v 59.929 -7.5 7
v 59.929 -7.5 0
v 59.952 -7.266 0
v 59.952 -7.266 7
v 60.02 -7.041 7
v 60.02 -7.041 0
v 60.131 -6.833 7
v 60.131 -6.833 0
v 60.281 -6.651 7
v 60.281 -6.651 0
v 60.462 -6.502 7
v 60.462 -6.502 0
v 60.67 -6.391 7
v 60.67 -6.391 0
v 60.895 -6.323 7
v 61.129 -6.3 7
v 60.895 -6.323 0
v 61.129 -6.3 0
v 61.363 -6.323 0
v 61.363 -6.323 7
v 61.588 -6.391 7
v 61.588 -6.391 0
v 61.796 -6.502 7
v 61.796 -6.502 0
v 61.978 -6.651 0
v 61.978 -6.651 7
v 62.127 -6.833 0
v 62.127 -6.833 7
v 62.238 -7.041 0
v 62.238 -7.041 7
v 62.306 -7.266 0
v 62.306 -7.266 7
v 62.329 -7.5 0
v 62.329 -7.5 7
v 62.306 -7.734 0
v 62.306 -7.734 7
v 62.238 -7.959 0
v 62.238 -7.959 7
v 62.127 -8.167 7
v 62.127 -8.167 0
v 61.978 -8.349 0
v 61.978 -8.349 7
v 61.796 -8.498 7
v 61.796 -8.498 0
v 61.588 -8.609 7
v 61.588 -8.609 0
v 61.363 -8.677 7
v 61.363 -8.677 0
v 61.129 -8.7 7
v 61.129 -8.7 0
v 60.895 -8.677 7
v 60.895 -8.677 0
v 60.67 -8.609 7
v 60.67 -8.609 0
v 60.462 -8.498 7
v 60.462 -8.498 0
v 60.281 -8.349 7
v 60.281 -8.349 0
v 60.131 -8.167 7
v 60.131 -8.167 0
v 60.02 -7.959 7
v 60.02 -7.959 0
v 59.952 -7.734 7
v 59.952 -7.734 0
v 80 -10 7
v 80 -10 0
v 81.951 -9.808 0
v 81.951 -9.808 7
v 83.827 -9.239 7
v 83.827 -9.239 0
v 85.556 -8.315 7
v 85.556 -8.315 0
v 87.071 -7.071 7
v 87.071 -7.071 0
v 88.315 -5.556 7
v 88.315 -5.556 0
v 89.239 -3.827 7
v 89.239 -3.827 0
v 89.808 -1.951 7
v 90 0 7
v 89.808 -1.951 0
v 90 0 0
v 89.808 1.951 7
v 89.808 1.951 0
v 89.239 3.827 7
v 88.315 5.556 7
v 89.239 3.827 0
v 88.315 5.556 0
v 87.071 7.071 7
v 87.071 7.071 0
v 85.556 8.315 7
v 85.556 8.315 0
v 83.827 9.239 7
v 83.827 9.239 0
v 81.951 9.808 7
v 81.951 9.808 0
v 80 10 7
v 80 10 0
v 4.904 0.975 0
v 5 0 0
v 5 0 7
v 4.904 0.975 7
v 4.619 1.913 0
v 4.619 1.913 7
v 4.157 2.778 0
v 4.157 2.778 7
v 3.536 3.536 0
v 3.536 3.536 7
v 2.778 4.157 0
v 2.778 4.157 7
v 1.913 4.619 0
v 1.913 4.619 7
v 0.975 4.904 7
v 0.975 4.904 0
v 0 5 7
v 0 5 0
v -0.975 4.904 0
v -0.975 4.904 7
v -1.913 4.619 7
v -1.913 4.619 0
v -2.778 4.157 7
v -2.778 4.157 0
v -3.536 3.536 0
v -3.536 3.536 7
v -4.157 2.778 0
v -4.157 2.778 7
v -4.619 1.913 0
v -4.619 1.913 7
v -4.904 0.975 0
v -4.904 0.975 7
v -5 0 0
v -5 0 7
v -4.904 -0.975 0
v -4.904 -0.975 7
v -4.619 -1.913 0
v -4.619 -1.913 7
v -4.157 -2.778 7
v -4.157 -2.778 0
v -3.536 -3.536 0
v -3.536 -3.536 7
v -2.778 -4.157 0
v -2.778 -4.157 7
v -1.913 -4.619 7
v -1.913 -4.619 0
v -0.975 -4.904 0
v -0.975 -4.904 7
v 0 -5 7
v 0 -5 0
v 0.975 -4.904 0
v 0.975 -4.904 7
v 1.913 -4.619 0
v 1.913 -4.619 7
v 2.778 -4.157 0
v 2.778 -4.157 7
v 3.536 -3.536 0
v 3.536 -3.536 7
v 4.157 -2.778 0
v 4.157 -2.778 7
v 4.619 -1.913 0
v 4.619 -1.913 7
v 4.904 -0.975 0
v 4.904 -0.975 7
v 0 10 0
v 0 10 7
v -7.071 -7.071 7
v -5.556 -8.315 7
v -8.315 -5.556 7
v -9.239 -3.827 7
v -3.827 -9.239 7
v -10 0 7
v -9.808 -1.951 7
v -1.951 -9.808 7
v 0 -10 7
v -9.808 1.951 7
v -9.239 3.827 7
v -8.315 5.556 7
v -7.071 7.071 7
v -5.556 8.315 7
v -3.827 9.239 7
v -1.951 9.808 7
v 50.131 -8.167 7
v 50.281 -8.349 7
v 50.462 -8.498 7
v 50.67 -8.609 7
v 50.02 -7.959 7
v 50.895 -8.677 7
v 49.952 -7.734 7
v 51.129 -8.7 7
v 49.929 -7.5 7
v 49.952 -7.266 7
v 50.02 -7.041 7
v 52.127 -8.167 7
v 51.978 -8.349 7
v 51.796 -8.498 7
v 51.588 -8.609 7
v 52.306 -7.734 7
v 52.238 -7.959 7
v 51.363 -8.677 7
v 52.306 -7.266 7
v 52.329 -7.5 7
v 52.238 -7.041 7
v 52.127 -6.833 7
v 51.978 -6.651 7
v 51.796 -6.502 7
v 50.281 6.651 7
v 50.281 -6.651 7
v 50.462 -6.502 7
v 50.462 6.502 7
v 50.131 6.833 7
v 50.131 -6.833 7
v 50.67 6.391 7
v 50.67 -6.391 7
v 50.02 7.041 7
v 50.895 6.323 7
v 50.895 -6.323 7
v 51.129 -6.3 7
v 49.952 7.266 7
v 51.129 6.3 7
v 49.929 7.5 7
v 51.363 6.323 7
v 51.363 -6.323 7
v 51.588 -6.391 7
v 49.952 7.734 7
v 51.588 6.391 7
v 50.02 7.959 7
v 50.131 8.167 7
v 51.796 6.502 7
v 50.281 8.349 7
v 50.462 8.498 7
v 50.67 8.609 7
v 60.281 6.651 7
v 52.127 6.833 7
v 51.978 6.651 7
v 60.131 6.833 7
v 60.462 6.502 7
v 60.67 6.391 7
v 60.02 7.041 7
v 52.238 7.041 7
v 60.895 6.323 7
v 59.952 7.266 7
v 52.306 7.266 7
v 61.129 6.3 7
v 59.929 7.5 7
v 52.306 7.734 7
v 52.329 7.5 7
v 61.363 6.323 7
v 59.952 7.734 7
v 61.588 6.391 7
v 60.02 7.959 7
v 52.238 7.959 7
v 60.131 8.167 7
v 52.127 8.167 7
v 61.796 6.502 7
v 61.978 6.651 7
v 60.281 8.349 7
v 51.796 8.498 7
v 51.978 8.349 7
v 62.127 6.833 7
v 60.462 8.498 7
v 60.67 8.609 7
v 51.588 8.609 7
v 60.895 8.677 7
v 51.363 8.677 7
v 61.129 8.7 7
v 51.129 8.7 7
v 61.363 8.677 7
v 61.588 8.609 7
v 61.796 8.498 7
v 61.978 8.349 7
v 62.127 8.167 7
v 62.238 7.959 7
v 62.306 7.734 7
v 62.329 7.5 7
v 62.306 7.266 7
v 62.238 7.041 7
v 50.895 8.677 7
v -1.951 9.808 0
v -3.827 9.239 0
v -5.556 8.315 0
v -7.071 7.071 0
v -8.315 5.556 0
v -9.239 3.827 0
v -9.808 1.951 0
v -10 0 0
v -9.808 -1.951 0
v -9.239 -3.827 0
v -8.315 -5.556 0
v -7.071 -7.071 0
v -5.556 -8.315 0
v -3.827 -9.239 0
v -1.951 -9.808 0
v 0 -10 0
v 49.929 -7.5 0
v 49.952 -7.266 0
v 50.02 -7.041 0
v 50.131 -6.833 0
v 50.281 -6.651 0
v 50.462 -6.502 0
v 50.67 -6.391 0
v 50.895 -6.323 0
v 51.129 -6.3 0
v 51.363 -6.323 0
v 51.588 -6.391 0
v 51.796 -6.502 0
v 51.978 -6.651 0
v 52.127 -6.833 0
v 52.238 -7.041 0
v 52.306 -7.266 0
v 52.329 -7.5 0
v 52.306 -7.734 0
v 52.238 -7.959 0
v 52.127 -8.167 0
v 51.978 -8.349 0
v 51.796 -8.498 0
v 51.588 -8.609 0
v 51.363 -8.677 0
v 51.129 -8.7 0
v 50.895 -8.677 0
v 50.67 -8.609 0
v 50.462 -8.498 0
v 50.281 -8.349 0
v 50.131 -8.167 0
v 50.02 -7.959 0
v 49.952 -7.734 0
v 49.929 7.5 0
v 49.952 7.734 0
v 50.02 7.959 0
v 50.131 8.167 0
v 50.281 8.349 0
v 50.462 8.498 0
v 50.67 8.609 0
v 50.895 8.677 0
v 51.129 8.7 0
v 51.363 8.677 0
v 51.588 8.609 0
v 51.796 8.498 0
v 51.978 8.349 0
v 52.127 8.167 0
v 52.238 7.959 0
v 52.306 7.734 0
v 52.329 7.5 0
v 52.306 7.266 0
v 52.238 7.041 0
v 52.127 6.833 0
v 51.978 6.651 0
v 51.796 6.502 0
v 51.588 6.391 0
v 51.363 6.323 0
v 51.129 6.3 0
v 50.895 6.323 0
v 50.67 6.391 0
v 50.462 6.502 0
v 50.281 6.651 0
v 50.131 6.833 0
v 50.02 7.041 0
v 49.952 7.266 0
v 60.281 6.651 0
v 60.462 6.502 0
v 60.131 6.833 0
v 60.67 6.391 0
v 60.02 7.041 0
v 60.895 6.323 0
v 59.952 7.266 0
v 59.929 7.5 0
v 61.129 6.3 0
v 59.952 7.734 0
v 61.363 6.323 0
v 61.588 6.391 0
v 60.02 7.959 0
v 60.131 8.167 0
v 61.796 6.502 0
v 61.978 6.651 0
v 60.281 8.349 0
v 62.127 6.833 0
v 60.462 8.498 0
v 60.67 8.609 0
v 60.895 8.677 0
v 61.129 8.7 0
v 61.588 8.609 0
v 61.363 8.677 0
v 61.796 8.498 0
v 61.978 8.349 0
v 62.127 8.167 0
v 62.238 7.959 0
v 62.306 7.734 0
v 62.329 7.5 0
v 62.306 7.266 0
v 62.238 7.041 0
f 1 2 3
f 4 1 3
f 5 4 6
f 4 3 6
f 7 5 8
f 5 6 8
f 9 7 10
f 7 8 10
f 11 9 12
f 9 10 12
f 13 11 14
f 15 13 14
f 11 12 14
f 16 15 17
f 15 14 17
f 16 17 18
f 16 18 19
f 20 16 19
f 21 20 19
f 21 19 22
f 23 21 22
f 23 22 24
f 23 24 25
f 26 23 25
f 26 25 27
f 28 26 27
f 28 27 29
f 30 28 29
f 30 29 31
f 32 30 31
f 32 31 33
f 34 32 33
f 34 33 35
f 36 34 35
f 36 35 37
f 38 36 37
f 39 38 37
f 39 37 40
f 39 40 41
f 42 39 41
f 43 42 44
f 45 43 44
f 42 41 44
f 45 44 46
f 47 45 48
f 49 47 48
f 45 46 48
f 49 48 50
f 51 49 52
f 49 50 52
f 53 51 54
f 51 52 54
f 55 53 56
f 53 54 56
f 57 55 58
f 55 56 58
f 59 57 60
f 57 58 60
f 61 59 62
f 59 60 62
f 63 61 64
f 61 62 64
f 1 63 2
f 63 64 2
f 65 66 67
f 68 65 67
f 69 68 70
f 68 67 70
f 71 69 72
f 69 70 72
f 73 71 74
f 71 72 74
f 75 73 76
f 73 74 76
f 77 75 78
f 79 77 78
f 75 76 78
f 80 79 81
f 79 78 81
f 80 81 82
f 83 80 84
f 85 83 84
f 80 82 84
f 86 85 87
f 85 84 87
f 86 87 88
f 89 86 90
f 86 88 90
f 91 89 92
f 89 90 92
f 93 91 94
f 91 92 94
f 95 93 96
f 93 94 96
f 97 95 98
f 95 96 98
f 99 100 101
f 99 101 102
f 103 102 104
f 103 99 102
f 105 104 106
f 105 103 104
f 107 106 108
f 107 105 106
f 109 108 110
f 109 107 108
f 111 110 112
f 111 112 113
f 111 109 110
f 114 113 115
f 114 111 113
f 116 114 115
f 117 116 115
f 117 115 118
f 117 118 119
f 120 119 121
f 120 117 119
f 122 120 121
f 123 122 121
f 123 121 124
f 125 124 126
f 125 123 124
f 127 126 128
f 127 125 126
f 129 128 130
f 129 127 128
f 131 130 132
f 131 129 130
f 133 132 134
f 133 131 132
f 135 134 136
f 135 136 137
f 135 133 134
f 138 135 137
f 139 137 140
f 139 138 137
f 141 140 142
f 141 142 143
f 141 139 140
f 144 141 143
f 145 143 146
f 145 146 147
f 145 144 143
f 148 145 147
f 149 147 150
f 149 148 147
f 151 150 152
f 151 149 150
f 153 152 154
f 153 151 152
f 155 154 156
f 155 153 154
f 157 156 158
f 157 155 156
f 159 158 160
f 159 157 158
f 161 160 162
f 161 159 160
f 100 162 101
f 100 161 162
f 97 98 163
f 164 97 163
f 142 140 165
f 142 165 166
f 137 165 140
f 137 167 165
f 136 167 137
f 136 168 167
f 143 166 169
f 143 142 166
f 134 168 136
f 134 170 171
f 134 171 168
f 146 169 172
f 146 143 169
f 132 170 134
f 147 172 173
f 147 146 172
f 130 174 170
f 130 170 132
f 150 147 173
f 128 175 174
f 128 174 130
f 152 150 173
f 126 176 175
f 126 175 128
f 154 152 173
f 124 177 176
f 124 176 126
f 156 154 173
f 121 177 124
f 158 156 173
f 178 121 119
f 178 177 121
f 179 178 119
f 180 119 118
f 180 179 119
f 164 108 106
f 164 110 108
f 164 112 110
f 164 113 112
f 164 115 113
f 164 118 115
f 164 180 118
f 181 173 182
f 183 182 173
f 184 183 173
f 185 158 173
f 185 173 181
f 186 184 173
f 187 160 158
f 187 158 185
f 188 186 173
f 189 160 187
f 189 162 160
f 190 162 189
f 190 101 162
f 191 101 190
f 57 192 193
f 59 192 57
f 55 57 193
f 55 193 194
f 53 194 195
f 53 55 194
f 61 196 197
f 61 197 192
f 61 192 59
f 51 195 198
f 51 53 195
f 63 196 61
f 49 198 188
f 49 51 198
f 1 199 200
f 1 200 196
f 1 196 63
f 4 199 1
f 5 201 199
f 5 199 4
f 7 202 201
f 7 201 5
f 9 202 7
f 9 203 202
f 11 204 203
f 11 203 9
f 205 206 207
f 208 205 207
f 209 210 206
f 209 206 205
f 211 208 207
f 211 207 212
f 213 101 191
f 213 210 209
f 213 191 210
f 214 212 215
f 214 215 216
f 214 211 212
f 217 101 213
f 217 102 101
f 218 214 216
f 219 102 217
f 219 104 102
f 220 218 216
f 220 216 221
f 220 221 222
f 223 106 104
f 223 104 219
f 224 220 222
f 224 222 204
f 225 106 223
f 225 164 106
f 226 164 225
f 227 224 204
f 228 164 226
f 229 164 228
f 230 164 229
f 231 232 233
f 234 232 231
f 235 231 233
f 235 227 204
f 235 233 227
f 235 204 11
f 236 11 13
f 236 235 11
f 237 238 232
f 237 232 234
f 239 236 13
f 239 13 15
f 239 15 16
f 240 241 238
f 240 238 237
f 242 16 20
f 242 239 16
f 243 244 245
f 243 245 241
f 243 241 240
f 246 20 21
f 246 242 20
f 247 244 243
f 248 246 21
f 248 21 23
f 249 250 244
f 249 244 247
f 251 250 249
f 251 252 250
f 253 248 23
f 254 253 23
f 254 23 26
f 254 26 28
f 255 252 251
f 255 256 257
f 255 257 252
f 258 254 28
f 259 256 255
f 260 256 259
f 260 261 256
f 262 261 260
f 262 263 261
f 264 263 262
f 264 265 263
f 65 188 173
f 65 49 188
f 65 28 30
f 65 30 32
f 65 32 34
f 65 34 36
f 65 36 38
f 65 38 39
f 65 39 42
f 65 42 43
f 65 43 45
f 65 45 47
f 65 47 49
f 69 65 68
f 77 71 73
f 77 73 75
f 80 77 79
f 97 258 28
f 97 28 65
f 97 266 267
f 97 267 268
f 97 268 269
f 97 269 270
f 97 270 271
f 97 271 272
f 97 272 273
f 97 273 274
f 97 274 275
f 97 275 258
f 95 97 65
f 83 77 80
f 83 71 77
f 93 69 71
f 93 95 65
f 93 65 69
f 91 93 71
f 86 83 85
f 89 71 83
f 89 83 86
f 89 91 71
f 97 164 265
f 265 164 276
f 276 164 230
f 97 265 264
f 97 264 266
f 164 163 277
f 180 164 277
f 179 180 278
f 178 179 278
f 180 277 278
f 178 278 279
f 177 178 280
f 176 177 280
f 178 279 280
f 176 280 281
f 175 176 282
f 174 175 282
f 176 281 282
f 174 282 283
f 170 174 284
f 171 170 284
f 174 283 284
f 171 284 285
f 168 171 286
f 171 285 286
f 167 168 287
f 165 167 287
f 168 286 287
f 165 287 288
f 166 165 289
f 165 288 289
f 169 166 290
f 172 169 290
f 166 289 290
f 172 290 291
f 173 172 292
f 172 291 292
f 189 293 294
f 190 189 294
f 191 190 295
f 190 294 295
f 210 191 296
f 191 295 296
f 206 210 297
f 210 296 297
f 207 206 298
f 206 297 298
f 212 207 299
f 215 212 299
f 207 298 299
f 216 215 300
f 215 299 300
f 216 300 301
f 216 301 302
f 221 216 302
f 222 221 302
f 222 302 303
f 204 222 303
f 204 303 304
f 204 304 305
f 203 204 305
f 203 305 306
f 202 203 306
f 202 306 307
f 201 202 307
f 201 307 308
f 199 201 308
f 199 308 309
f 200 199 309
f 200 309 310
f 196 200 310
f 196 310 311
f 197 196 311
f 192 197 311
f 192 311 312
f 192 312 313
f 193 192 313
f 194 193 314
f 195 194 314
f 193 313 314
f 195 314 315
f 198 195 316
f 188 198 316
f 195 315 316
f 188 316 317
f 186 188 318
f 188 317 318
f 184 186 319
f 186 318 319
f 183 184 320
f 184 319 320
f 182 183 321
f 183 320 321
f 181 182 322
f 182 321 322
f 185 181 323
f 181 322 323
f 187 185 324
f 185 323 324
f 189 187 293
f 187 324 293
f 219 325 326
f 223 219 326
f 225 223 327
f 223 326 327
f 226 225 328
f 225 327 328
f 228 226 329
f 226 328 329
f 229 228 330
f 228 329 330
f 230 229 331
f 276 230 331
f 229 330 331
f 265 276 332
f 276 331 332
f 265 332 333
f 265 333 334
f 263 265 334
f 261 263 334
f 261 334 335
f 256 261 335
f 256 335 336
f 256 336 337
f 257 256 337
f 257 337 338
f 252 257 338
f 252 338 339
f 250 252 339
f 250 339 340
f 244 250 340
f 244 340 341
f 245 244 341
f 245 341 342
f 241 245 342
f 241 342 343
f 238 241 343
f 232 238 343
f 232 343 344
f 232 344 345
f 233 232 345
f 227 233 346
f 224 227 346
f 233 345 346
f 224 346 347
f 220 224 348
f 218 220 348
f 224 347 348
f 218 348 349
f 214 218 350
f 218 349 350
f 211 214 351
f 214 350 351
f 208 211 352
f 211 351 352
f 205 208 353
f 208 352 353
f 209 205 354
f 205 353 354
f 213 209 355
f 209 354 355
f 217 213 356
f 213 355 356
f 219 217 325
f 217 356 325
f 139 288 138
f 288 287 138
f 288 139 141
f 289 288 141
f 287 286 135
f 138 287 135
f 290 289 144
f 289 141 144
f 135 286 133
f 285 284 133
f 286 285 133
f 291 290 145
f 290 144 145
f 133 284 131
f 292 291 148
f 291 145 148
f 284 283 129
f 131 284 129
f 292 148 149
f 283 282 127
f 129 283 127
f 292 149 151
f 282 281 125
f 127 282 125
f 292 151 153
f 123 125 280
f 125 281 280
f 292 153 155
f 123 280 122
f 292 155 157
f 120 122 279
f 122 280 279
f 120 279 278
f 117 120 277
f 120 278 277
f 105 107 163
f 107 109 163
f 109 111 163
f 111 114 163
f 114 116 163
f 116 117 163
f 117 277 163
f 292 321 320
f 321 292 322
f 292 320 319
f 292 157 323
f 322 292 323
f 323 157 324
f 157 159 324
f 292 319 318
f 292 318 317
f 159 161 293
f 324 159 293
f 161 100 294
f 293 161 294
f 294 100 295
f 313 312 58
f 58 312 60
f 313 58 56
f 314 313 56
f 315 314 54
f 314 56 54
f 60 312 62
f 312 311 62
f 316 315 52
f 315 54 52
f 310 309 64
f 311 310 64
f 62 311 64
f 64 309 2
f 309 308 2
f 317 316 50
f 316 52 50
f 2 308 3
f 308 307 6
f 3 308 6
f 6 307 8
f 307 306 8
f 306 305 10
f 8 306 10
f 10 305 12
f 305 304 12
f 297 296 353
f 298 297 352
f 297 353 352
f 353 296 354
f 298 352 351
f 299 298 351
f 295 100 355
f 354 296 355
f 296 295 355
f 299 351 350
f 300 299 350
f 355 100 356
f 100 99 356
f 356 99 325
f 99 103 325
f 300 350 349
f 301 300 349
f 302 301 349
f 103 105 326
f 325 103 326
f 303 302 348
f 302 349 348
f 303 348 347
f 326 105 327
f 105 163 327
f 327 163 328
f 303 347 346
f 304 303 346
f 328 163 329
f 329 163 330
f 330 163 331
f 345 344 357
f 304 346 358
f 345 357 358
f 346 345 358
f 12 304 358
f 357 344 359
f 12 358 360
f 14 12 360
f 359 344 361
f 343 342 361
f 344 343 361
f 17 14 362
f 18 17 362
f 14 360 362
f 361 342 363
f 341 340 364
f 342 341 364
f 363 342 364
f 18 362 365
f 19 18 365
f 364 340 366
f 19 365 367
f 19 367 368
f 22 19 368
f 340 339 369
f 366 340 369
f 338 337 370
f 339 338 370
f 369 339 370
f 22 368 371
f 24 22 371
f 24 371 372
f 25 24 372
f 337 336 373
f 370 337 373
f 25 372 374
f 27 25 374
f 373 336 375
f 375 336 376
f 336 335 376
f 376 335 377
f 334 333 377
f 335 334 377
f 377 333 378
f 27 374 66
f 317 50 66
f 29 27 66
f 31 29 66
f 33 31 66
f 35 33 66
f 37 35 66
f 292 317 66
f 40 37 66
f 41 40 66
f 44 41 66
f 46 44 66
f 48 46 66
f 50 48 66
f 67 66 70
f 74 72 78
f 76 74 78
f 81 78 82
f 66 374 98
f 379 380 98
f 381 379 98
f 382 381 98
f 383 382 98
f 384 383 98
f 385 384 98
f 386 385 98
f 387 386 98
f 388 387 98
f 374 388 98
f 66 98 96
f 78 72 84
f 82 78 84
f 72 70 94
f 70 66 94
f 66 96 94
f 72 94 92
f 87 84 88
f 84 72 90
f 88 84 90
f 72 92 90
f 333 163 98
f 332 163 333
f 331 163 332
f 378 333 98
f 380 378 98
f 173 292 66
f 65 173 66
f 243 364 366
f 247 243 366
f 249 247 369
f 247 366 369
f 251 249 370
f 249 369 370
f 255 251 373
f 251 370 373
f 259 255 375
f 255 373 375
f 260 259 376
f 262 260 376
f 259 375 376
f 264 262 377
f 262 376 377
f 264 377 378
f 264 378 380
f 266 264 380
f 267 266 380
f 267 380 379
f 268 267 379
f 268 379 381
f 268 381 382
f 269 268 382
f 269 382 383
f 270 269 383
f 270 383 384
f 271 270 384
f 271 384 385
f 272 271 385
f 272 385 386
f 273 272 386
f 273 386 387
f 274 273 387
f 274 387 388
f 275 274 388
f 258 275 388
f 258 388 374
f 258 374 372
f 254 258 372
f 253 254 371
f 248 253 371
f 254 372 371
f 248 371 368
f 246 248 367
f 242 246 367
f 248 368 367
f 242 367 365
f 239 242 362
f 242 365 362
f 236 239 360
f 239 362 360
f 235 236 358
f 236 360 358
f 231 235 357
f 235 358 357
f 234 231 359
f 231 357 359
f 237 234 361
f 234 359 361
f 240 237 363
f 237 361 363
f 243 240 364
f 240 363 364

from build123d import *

# Parameters (mm, degrees)
SKETCH_1_R          = 10
SKETCH_1_R_2        = 5
EXTRUDE_1_DEPTH     = 7
SKETCH_2_R          = 1.2
CUT_EXTRUDE_1_DEPTH = 10


with BuildPart() as part:
    # 草图1 → 凸台-拉伸1 (new body)
    # profile 1 of 2: a face of its own
    with BuildSketch(Plane.XY):
        Circle(SKETCH_1_R)
        Circle(SKETCH_1_R_2, mode=Mode.SUBTRACT)
    # profile 2 of 2: a face of its own
    with BuildSketch(Plane.XY):
        with BuildLine():
            Line((80, 10), (0, 10))
            ThreePointArc((0, 10), (7.071067812, 7.071067812), (10, 0))
            ThreePointArc((10, 0), (7.071067812, -7.071067812), (0, -10))
            Line((0, -10), (80, -10))
            ThreePointArc((80, -10), (90, 0), (80, 10))
        make_face()
    extrude(amount=EXTRUDE_1_DEPTH)

    # 草图2 → 切除-拉伸1 (cut)
    with BuildSketch(Plane(origin=(0, 0, 0), x_dir=(-1, 0, 0), z_dir=(0, 0, -1))):
        with Locations((-51.129038153, -7.5)):
            Circle(SKETCH_2_R)
        with Locations((-61.129038153, -7.5)):
            Circle(SKETCH_2_R)
        with Locations((-61.129038153, 7.5)):
            Circle(SKETCH_2_R)
        with Locations((-51.129038153, 7.5)):
            Circle(SKETCH_2_R)
    extrude(amount=-CUT_EXTRUDE_1_DEPTH, mode=Mode.SUBTRACT)


solid = part.part
